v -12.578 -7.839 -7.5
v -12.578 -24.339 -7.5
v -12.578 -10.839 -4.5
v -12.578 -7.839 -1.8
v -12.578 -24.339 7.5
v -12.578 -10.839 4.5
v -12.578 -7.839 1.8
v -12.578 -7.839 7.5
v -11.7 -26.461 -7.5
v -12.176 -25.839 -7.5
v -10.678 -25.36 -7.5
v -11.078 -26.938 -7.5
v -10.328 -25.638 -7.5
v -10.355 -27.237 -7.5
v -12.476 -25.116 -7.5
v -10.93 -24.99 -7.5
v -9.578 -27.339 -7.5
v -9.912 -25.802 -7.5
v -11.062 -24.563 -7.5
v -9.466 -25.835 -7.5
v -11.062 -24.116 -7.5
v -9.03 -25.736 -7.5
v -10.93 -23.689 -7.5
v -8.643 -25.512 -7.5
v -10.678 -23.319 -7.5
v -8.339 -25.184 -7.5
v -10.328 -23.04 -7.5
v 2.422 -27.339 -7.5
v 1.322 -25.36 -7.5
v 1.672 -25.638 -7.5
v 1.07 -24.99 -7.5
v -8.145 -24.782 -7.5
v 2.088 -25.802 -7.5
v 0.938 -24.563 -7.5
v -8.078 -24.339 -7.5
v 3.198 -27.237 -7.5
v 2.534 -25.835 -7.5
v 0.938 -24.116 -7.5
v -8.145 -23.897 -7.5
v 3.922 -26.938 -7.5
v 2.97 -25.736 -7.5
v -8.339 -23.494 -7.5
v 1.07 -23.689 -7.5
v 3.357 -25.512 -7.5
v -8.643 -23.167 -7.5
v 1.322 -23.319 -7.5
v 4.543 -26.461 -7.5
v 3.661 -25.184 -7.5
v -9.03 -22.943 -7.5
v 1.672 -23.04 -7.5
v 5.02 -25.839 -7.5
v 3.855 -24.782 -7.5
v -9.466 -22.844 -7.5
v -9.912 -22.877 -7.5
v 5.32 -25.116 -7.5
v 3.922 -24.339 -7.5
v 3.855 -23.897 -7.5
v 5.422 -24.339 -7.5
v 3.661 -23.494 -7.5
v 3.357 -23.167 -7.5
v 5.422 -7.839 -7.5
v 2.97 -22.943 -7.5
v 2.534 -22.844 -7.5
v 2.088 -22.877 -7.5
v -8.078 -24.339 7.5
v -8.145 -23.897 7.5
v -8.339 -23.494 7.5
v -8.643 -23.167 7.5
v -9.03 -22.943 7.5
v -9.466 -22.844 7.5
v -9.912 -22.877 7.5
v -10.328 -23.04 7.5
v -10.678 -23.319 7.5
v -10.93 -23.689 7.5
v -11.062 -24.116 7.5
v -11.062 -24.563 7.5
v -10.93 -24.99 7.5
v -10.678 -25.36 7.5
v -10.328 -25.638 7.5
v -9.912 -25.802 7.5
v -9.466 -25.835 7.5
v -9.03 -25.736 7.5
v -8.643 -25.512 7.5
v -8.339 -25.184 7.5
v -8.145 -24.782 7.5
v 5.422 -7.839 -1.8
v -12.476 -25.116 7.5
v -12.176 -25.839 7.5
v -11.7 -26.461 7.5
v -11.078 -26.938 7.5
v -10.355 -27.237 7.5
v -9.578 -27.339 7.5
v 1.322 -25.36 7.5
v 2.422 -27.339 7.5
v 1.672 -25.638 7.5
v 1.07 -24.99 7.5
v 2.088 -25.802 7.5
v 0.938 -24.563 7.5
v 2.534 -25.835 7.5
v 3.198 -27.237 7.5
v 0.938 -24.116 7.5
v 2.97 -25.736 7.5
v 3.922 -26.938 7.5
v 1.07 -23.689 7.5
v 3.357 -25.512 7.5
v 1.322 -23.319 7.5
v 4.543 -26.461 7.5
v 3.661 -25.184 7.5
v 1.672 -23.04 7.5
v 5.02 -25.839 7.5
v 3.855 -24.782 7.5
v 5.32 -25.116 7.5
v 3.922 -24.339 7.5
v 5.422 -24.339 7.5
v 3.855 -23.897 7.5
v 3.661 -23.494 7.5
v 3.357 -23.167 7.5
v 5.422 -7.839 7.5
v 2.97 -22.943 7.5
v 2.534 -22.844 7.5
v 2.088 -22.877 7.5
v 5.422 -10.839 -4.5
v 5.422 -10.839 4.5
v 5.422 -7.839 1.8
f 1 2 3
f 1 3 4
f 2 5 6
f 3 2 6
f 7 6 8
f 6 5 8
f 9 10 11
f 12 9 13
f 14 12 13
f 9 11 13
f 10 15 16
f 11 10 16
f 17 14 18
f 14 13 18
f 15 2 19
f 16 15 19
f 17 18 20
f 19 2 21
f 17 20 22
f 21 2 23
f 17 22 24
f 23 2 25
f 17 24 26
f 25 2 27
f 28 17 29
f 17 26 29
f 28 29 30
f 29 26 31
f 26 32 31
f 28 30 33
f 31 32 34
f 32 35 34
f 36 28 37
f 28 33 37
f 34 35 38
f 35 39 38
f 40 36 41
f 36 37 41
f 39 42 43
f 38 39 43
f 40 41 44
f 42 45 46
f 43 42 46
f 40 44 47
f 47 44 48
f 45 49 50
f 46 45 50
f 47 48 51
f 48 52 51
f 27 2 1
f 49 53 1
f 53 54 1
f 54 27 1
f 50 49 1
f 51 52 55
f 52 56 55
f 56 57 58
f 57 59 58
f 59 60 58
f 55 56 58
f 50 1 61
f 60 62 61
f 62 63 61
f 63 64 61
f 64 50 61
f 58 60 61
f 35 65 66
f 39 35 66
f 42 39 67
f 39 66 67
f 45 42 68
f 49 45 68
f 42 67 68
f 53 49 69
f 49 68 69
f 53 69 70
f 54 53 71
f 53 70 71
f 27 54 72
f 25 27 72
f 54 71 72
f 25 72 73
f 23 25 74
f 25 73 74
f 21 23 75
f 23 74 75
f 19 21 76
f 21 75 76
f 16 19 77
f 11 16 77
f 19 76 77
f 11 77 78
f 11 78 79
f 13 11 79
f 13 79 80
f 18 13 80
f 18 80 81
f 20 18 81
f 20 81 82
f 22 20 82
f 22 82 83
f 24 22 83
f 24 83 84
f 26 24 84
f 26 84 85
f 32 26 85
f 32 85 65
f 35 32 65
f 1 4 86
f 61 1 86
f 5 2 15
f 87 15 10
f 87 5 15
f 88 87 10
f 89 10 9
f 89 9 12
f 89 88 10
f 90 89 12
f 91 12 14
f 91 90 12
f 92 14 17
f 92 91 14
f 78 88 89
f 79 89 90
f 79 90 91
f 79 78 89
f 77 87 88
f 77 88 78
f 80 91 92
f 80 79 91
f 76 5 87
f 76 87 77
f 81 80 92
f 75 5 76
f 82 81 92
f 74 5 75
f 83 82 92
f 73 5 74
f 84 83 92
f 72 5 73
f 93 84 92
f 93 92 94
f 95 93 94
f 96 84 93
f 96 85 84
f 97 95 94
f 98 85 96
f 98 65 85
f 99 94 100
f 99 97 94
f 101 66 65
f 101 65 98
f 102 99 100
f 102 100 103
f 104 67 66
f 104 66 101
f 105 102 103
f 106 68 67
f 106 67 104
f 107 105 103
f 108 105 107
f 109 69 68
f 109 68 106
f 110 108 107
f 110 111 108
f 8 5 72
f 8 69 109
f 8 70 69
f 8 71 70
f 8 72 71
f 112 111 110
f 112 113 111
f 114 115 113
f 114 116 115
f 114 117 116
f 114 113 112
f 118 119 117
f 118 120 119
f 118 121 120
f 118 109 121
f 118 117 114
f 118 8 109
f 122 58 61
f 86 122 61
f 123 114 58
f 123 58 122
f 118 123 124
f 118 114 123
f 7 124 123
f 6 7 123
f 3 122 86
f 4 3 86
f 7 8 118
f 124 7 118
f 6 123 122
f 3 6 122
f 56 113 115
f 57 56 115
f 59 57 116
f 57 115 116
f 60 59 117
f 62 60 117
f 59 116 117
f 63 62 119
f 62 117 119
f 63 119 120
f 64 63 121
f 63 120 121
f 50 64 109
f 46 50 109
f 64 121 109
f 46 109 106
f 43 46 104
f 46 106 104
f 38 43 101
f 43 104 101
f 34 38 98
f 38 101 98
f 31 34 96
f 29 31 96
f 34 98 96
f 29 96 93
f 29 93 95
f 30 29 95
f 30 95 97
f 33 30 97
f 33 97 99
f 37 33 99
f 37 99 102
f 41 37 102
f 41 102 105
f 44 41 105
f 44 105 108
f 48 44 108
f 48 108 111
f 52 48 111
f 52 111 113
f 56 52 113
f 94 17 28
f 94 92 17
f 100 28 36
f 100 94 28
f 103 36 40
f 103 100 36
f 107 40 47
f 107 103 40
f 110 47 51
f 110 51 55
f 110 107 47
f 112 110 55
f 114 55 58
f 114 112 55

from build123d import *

# Parameters (mm, degrees)
SKETCH1_W           = 60
SKETCH1_H           = 65
BOSS_EXTRUDE1_DEPTH = 25
CUT_EXTRUDE1_DEPTH  = 60
SKETCH4_R           = 5
CUT_EXTRUDE2_DEPTH  = 51
FILLET1_R           = 10
SCALE1_SCALE        = 0.3


with BuildPart() as part:
    # Sketch1 → Boss-Extrude1 (new body, symmetric)
    with BuildSketch(Plane.XY):
        with Locations((-3.578258959, -17.200317296)):
            Rectangle(SKETCH1_W, SKETCH1_H)
    extrude(amount=BOSS_EXTRUDE1_DEPTH, both=True)

    # Sketch3 → Cut-Extrude1 (cut)
    with BuildSketch(Plane(origin=(26.421741041, 0, 0), x_dir=(0, 0, -1), z_dir=(1, 0, 0))):
        Polygon((-15, 5.299682704), (15, 5.299682704), (6, 15.299682704), (-6, 15.299682704), align=None)
    extrude(amount=-CUT_EXTRUDE1_DEPTH, mode=Mode.SUBTRACT)

    # Sketch4 → Cut-Extrude2 (cut, through all)
    with BuildSketch(Plane.XY.offset(25)):
        with Locations((16.421741041, -39.700317296)):
            Circle(SKETCH4_R)
        with Locations((-23.578258959, -39.700317296)):
            Circle(SKETCH4_R)
    extrude(amount=-CUT_EXTRUDE2_DEPTH, mode=Mode.SUBTRACT)

    # Fillet1
    fillet1_edges = [part.edges().sort_by_distance(p)[0] for p in [
        (26.421741041, -49.700317296, 0),
        (-33.578258959, -49.700317296, 0),
    ]]
    fillet(fillet1_edges, radius=FILLET1_R)


with BuildPart() as part_1:
    # Scale1: scaled about (-3.578258959, -17.756195099, 0)
    add(part.part.scale(SCALE1_SCALE).moved(Location((-2.504781271, -12.429336569, 0))))


solid = part_1.part
